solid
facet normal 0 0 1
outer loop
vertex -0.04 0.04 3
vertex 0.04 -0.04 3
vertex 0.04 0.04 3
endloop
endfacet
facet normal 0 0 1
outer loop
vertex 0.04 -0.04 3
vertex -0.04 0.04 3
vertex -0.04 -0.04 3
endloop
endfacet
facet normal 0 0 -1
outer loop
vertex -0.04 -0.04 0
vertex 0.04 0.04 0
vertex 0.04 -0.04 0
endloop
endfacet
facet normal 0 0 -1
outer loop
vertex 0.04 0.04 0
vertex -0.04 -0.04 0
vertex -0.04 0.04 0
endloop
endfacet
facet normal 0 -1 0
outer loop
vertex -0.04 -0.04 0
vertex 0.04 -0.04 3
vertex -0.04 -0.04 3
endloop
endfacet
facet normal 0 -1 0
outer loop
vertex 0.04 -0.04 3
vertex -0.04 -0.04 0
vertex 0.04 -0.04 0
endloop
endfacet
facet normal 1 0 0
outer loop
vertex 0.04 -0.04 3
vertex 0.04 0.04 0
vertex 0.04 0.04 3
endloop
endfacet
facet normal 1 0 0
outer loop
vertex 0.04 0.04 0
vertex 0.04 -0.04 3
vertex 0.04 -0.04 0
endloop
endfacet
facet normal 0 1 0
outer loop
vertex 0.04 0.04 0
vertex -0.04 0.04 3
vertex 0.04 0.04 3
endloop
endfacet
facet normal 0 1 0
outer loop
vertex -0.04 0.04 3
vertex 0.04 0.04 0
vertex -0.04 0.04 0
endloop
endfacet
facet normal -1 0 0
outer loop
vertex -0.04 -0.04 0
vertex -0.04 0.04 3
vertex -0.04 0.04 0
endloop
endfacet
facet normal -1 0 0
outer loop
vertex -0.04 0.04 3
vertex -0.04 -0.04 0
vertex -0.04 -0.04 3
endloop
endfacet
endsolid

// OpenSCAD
// Tent shell kit: corner inner. See lib/lodge_kit.scad.
include <lib/lodge_kit.scad>
kind = "tent";
corner_inner();
